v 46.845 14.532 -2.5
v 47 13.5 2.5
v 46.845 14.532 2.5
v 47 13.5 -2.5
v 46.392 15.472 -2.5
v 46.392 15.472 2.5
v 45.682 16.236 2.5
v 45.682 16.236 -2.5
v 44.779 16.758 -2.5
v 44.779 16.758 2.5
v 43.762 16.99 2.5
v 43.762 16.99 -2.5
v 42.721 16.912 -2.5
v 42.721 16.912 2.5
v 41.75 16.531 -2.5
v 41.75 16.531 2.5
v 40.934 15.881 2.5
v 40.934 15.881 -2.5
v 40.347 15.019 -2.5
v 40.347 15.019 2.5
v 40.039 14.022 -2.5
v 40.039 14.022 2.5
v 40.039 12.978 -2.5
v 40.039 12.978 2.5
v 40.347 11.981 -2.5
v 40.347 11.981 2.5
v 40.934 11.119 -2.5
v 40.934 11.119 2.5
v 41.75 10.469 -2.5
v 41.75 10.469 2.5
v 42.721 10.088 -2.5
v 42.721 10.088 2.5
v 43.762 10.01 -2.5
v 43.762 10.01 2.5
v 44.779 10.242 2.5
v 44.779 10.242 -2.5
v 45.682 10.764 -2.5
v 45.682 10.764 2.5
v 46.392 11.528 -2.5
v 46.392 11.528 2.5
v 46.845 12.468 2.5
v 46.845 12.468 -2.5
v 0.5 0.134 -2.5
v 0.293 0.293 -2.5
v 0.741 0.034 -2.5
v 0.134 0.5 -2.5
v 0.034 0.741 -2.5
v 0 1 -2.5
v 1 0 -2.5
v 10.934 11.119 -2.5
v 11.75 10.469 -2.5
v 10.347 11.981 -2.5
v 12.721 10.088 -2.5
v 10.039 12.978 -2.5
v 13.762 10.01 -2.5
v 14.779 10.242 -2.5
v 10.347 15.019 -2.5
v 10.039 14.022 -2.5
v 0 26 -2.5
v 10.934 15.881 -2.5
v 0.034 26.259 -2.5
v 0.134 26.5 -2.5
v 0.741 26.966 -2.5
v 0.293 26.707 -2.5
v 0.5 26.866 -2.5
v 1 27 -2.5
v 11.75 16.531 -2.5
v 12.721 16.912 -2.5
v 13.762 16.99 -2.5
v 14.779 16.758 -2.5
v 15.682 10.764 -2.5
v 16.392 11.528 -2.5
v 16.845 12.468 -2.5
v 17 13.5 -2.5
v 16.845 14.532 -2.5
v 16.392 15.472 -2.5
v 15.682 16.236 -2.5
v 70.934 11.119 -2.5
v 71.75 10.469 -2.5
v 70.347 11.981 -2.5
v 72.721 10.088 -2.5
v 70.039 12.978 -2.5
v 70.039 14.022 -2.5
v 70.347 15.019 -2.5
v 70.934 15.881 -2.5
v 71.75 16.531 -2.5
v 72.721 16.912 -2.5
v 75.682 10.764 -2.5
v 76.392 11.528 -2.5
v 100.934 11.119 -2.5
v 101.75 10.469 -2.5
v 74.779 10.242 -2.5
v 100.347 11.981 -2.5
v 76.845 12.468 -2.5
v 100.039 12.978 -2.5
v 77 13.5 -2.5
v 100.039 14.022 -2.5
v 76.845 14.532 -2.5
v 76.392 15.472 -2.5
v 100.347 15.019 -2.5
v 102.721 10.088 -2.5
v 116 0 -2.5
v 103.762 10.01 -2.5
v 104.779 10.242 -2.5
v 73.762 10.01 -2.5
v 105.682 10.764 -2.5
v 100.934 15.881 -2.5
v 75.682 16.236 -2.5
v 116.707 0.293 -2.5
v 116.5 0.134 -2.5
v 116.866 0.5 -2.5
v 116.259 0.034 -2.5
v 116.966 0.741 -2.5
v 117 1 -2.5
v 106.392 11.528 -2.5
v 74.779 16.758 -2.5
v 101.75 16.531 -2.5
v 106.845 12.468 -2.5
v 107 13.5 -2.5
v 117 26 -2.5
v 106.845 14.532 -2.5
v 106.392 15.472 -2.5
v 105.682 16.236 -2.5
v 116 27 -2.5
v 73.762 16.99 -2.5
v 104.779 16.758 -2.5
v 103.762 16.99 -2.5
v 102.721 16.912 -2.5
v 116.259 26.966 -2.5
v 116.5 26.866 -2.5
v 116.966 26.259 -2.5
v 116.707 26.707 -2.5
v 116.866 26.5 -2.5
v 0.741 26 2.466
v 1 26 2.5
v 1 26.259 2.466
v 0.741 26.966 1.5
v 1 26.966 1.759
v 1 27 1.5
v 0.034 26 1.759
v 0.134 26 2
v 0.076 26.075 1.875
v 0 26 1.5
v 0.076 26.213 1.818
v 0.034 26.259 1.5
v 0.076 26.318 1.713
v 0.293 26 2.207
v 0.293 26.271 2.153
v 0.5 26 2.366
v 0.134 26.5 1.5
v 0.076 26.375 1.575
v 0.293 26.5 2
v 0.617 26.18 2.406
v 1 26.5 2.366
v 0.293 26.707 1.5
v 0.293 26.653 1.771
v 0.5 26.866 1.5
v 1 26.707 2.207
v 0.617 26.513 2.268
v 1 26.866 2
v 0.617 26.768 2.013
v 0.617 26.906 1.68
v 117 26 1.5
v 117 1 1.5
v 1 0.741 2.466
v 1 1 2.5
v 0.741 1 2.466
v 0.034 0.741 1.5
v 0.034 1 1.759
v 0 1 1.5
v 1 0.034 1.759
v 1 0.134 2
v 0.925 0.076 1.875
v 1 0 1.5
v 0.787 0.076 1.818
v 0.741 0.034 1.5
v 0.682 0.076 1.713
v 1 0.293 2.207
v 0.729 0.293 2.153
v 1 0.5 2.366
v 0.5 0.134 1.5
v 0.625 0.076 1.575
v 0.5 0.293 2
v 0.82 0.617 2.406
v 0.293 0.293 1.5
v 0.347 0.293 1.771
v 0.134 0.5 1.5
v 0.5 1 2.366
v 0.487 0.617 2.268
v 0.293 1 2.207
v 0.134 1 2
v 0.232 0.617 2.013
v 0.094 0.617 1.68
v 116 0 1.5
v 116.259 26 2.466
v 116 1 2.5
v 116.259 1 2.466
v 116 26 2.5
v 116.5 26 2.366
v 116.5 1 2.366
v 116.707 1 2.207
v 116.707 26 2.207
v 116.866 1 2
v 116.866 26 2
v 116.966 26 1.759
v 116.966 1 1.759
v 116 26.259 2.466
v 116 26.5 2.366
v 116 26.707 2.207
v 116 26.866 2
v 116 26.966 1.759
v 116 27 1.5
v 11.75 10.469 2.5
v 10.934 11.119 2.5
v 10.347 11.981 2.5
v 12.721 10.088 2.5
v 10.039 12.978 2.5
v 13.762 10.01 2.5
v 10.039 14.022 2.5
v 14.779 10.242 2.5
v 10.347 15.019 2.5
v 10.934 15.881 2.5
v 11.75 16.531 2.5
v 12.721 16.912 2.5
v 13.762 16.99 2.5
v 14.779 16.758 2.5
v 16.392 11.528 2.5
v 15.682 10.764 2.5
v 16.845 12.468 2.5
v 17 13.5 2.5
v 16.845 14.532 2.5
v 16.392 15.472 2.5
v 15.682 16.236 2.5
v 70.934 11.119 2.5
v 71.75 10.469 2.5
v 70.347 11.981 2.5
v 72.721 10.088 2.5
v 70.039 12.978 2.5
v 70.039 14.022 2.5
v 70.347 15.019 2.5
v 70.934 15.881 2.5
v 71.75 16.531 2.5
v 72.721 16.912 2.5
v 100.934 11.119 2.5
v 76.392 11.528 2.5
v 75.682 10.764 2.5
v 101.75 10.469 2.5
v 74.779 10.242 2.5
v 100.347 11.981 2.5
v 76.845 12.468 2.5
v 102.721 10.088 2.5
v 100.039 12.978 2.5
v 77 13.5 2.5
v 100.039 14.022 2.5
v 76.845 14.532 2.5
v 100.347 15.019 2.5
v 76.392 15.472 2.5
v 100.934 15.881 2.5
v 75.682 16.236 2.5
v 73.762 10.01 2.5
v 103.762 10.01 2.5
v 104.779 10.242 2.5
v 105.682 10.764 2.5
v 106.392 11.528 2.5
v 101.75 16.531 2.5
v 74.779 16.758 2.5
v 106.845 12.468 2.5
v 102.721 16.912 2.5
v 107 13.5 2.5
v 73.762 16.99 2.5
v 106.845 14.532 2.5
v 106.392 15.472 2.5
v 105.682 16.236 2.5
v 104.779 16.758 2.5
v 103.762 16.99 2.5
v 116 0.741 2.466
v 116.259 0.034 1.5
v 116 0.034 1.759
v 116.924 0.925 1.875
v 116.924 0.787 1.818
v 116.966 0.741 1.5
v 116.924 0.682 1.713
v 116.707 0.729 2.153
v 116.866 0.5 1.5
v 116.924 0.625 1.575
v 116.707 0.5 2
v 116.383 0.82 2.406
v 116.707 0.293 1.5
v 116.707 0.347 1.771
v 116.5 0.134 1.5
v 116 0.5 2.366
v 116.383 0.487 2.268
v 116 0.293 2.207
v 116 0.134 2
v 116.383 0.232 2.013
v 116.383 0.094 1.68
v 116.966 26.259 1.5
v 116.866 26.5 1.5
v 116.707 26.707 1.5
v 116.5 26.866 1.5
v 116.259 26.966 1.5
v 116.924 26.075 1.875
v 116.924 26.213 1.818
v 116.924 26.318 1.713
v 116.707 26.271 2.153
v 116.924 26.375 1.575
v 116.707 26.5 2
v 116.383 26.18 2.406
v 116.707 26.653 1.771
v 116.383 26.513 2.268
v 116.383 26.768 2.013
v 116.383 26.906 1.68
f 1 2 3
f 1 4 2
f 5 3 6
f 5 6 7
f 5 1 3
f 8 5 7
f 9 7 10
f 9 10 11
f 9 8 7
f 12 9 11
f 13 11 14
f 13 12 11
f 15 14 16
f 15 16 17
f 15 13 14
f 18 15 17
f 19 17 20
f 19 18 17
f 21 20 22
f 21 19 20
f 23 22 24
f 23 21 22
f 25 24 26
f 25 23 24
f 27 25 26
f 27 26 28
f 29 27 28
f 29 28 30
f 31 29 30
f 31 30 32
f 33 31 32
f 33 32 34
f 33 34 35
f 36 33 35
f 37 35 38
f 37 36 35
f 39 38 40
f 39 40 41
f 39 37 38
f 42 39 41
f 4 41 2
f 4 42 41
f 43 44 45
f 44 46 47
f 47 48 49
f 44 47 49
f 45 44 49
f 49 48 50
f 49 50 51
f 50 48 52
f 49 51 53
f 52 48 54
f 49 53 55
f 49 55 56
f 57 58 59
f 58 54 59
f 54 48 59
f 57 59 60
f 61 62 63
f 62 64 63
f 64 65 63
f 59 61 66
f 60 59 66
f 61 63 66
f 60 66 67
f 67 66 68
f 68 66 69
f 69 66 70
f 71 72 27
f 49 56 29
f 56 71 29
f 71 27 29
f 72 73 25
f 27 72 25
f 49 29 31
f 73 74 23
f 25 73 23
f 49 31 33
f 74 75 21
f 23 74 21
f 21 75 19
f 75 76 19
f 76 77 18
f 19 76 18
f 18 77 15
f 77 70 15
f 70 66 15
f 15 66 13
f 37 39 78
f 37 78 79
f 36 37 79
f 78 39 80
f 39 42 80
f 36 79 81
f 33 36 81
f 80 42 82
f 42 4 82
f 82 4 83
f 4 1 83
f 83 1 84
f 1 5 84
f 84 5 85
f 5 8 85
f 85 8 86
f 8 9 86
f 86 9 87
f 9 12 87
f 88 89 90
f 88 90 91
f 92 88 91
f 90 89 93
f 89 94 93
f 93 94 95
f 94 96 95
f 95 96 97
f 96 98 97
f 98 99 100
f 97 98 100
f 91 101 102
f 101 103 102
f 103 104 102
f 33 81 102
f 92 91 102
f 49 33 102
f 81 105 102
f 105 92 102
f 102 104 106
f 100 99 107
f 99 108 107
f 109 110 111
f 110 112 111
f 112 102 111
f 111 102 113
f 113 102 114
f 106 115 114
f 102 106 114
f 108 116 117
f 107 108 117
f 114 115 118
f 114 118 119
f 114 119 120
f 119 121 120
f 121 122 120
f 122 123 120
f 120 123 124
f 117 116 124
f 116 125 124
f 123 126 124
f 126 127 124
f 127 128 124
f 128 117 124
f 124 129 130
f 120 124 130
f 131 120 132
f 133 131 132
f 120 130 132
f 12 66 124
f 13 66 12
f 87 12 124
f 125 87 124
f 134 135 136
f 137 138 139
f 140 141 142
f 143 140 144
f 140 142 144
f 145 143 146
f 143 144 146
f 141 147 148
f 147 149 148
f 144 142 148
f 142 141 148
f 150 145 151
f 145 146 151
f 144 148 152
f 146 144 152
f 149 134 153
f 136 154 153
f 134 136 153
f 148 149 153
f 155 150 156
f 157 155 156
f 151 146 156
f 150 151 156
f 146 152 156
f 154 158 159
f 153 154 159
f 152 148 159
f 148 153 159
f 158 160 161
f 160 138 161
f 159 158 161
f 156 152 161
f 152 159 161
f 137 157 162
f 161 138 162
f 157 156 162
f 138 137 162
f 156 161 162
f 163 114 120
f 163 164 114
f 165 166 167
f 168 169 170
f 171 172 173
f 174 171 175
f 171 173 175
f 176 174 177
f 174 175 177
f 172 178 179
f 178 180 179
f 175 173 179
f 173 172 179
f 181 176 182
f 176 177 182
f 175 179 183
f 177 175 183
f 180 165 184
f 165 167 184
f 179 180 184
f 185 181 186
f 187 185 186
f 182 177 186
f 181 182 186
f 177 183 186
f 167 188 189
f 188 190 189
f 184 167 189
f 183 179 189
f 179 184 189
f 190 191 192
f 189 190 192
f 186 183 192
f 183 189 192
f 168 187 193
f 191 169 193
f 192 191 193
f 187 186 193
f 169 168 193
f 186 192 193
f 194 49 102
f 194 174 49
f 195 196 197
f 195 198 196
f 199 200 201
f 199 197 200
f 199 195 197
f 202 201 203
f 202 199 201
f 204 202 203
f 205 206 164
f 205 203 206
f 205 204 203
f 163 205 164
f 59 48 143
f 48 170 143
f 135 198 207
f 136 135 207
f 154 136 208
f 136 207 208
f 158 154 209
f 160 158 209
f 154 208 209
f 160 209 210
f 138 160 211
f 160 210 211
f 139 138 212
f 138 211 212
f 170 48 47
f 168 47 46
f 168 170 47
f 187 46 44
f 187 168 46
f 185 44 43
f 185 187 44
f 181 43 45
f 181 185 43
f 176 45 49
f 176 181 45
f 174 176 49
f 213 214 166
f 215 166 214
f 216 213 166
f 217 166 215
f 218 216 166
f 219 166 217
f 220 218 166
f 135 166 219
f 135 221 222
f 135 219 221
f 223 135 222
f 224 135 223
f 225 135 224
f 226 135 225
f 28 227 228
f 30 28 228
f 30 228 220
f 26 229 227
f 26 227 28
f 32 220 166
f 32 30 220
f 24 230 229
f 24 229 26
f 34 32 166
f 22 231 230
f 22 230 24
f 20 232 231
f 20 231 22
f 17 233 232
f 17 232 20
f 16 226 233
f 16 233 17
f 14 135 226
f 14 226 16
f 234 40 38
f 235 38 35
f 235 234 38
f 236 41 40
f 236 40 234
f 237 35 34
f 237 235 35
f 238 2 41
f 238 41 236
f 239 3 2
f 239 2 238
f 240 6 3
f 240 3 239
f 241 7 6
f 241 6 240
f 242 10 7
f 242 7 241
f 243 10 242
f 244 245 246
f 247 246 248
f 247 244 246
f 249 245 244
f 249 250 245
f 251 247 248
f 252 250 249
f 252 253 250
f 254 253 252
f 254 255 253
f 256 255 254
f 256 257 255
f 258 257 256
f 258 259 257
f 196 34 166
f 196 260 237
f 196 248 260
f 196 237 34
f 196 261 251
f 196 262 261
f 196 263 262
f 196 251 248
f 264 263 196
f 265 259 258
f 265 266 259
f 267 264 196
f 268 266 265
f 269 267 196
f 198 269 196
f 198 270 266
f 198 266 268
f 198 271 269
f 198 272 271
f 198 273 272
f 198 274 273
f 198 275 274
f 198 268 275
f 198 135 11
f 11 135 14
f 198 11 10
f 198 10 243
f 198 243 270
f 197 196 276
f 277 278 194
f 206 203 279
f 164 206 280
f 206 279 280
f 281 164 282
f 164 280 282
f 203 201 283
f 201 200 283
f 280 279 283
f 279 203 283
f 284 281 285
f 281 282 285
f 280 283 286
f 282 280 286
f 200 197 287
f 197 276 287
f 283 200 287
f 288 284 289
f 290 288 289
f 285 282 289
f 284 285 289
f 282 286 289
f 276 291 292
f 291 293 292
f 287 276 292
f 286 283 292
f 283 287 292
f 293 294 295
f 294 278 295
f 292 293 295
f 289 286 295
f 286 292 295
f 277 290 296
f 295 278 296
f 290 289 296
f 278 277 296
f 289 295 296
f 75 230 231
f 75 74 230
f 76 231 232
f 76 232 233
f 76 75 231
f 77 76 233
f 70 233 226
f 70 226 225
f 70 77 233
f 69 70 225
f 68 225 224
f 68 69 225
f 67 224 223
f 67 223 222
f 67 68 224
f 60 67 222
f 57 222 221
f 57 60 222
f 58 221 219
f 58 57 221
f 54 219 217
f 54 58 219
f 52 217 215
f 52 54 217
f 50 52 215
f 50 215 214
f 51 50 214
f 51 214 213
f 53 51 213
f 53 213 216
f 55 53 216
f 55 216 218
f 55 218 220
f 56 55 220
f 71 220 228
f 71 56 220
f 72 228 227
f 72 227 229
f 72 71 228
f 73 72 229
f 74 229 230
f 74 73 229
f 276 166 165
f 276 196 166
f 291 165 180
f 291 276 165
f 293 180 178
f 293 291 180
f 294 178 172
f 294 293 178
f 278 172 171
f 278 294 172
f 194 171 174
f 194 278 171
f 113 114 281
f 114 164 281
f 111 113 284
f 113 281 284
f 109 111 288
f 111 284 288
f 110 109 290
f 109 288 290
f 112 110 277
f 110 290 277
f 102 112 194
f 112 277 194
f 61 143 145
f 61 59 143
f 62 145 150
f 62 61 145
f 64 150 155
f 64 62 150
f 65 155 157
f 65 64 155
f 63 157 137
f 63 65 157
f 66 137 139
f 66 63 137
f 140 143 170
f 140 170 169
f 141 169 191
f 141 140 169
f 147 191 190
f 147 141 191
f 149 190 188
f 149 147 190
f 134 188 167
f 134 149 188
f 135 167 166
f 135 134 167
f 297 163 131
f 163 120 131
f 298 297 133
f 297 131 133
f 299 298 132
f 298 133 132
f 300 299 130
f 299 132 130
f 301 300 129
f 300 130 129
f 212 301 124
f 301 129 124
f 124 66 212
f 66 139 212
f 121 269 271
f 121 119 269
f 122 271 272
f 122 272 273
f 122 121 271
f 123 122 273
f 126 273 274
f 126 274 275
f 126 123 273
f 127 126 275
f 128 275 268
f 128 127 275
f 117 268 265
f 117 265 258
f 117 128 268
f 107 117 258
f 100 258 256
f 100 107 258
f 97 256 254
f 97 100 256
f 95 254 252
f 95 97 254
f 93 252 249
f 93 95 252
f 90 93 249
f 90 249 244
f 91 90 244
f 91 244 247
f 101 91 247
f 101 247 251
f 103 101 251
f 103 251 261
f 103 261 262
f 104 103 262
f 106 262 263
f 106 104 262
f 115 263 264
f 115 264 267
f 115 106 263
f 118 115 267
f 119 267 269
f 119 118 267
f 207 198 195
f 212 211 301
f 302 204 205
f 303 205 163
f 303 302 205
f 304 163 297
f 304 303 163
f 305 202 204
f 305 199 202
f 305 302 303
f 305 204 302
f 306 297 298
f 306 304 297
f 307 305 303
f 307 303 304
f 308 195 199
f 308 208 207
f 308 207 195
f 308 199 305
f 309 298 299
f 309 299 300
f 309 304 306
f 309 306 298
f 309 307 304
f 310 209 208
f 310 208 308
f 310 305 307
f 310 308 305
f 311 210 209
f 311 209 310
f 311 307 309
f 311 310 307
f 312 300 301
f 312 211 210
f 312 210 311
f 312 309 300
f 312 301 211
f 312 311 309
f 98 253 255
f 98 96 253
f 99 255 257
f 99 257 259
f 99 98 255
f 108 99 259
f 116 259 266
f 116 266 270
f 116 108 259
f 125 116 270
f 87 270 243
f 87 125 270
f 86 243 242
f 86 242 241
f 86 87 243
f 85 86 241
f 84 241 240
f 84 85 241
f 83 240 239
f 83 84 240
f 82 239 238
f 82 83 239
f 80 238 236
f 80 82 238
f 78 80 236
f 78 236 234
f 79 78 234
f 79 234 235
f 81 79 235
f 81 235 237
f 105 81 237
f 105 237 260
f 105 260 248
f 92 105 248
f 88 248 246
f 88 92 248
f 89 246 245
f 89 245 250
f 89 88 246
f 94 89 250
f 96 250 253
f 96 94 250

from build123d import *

# Parameters (mm, degrees)
SKETCH1_W           = 117
SKETCH1_H           = 27
SKETCH1_R           = 3.5
BOSS_EXTRUDE1_DEPTH = 2.5
FILLET1_R           = 1


with BuildPart() as part:
    # Sketch1 → Boss-Extrude1 (new body, symmetric)
    with BuildSketch(Plane.XY):
        with Locations((58.5, 13.5)):
            Rectangle(SKETCH1_W, SKETCH1_H)
        with Locations((13.5, 13.5)):
            Circle(SKETCH1_R, mode=Mode.SUBTRACT)
        with Locations((43.5, 13.5)):
            Circle(SKETCH1_R, mode=Mode.SUBTRACT)
        with Locations((73.5, 13.5)):
            Circle(SKETCH1_R, mode=Mode.SUBTRACT)
        with Locations((103.5, 13.5)):
            Circle(SKETCH1_R, mode=Mode.SUBTRACT)
    extrude(amount=BOSS_EXTRUDE1_DEPTH, both=True)

    # Fillet1
    fillet1_edges = [part.edges().sort_by_distance(p)[0] for p in [
        (58.5, 27, 2.5),
        (0, 13.5, 2.5),
        (58.5, 0, 2.5),
        (117, 13.5, 2.5),
        (0, 0, 0),
        (0, 27, 0),
        (117, 27, 0),
        (117, 0, 0),
    ]]
    fillet(fillet1_edges, radius=FILLET1_R)


solid = part.part
